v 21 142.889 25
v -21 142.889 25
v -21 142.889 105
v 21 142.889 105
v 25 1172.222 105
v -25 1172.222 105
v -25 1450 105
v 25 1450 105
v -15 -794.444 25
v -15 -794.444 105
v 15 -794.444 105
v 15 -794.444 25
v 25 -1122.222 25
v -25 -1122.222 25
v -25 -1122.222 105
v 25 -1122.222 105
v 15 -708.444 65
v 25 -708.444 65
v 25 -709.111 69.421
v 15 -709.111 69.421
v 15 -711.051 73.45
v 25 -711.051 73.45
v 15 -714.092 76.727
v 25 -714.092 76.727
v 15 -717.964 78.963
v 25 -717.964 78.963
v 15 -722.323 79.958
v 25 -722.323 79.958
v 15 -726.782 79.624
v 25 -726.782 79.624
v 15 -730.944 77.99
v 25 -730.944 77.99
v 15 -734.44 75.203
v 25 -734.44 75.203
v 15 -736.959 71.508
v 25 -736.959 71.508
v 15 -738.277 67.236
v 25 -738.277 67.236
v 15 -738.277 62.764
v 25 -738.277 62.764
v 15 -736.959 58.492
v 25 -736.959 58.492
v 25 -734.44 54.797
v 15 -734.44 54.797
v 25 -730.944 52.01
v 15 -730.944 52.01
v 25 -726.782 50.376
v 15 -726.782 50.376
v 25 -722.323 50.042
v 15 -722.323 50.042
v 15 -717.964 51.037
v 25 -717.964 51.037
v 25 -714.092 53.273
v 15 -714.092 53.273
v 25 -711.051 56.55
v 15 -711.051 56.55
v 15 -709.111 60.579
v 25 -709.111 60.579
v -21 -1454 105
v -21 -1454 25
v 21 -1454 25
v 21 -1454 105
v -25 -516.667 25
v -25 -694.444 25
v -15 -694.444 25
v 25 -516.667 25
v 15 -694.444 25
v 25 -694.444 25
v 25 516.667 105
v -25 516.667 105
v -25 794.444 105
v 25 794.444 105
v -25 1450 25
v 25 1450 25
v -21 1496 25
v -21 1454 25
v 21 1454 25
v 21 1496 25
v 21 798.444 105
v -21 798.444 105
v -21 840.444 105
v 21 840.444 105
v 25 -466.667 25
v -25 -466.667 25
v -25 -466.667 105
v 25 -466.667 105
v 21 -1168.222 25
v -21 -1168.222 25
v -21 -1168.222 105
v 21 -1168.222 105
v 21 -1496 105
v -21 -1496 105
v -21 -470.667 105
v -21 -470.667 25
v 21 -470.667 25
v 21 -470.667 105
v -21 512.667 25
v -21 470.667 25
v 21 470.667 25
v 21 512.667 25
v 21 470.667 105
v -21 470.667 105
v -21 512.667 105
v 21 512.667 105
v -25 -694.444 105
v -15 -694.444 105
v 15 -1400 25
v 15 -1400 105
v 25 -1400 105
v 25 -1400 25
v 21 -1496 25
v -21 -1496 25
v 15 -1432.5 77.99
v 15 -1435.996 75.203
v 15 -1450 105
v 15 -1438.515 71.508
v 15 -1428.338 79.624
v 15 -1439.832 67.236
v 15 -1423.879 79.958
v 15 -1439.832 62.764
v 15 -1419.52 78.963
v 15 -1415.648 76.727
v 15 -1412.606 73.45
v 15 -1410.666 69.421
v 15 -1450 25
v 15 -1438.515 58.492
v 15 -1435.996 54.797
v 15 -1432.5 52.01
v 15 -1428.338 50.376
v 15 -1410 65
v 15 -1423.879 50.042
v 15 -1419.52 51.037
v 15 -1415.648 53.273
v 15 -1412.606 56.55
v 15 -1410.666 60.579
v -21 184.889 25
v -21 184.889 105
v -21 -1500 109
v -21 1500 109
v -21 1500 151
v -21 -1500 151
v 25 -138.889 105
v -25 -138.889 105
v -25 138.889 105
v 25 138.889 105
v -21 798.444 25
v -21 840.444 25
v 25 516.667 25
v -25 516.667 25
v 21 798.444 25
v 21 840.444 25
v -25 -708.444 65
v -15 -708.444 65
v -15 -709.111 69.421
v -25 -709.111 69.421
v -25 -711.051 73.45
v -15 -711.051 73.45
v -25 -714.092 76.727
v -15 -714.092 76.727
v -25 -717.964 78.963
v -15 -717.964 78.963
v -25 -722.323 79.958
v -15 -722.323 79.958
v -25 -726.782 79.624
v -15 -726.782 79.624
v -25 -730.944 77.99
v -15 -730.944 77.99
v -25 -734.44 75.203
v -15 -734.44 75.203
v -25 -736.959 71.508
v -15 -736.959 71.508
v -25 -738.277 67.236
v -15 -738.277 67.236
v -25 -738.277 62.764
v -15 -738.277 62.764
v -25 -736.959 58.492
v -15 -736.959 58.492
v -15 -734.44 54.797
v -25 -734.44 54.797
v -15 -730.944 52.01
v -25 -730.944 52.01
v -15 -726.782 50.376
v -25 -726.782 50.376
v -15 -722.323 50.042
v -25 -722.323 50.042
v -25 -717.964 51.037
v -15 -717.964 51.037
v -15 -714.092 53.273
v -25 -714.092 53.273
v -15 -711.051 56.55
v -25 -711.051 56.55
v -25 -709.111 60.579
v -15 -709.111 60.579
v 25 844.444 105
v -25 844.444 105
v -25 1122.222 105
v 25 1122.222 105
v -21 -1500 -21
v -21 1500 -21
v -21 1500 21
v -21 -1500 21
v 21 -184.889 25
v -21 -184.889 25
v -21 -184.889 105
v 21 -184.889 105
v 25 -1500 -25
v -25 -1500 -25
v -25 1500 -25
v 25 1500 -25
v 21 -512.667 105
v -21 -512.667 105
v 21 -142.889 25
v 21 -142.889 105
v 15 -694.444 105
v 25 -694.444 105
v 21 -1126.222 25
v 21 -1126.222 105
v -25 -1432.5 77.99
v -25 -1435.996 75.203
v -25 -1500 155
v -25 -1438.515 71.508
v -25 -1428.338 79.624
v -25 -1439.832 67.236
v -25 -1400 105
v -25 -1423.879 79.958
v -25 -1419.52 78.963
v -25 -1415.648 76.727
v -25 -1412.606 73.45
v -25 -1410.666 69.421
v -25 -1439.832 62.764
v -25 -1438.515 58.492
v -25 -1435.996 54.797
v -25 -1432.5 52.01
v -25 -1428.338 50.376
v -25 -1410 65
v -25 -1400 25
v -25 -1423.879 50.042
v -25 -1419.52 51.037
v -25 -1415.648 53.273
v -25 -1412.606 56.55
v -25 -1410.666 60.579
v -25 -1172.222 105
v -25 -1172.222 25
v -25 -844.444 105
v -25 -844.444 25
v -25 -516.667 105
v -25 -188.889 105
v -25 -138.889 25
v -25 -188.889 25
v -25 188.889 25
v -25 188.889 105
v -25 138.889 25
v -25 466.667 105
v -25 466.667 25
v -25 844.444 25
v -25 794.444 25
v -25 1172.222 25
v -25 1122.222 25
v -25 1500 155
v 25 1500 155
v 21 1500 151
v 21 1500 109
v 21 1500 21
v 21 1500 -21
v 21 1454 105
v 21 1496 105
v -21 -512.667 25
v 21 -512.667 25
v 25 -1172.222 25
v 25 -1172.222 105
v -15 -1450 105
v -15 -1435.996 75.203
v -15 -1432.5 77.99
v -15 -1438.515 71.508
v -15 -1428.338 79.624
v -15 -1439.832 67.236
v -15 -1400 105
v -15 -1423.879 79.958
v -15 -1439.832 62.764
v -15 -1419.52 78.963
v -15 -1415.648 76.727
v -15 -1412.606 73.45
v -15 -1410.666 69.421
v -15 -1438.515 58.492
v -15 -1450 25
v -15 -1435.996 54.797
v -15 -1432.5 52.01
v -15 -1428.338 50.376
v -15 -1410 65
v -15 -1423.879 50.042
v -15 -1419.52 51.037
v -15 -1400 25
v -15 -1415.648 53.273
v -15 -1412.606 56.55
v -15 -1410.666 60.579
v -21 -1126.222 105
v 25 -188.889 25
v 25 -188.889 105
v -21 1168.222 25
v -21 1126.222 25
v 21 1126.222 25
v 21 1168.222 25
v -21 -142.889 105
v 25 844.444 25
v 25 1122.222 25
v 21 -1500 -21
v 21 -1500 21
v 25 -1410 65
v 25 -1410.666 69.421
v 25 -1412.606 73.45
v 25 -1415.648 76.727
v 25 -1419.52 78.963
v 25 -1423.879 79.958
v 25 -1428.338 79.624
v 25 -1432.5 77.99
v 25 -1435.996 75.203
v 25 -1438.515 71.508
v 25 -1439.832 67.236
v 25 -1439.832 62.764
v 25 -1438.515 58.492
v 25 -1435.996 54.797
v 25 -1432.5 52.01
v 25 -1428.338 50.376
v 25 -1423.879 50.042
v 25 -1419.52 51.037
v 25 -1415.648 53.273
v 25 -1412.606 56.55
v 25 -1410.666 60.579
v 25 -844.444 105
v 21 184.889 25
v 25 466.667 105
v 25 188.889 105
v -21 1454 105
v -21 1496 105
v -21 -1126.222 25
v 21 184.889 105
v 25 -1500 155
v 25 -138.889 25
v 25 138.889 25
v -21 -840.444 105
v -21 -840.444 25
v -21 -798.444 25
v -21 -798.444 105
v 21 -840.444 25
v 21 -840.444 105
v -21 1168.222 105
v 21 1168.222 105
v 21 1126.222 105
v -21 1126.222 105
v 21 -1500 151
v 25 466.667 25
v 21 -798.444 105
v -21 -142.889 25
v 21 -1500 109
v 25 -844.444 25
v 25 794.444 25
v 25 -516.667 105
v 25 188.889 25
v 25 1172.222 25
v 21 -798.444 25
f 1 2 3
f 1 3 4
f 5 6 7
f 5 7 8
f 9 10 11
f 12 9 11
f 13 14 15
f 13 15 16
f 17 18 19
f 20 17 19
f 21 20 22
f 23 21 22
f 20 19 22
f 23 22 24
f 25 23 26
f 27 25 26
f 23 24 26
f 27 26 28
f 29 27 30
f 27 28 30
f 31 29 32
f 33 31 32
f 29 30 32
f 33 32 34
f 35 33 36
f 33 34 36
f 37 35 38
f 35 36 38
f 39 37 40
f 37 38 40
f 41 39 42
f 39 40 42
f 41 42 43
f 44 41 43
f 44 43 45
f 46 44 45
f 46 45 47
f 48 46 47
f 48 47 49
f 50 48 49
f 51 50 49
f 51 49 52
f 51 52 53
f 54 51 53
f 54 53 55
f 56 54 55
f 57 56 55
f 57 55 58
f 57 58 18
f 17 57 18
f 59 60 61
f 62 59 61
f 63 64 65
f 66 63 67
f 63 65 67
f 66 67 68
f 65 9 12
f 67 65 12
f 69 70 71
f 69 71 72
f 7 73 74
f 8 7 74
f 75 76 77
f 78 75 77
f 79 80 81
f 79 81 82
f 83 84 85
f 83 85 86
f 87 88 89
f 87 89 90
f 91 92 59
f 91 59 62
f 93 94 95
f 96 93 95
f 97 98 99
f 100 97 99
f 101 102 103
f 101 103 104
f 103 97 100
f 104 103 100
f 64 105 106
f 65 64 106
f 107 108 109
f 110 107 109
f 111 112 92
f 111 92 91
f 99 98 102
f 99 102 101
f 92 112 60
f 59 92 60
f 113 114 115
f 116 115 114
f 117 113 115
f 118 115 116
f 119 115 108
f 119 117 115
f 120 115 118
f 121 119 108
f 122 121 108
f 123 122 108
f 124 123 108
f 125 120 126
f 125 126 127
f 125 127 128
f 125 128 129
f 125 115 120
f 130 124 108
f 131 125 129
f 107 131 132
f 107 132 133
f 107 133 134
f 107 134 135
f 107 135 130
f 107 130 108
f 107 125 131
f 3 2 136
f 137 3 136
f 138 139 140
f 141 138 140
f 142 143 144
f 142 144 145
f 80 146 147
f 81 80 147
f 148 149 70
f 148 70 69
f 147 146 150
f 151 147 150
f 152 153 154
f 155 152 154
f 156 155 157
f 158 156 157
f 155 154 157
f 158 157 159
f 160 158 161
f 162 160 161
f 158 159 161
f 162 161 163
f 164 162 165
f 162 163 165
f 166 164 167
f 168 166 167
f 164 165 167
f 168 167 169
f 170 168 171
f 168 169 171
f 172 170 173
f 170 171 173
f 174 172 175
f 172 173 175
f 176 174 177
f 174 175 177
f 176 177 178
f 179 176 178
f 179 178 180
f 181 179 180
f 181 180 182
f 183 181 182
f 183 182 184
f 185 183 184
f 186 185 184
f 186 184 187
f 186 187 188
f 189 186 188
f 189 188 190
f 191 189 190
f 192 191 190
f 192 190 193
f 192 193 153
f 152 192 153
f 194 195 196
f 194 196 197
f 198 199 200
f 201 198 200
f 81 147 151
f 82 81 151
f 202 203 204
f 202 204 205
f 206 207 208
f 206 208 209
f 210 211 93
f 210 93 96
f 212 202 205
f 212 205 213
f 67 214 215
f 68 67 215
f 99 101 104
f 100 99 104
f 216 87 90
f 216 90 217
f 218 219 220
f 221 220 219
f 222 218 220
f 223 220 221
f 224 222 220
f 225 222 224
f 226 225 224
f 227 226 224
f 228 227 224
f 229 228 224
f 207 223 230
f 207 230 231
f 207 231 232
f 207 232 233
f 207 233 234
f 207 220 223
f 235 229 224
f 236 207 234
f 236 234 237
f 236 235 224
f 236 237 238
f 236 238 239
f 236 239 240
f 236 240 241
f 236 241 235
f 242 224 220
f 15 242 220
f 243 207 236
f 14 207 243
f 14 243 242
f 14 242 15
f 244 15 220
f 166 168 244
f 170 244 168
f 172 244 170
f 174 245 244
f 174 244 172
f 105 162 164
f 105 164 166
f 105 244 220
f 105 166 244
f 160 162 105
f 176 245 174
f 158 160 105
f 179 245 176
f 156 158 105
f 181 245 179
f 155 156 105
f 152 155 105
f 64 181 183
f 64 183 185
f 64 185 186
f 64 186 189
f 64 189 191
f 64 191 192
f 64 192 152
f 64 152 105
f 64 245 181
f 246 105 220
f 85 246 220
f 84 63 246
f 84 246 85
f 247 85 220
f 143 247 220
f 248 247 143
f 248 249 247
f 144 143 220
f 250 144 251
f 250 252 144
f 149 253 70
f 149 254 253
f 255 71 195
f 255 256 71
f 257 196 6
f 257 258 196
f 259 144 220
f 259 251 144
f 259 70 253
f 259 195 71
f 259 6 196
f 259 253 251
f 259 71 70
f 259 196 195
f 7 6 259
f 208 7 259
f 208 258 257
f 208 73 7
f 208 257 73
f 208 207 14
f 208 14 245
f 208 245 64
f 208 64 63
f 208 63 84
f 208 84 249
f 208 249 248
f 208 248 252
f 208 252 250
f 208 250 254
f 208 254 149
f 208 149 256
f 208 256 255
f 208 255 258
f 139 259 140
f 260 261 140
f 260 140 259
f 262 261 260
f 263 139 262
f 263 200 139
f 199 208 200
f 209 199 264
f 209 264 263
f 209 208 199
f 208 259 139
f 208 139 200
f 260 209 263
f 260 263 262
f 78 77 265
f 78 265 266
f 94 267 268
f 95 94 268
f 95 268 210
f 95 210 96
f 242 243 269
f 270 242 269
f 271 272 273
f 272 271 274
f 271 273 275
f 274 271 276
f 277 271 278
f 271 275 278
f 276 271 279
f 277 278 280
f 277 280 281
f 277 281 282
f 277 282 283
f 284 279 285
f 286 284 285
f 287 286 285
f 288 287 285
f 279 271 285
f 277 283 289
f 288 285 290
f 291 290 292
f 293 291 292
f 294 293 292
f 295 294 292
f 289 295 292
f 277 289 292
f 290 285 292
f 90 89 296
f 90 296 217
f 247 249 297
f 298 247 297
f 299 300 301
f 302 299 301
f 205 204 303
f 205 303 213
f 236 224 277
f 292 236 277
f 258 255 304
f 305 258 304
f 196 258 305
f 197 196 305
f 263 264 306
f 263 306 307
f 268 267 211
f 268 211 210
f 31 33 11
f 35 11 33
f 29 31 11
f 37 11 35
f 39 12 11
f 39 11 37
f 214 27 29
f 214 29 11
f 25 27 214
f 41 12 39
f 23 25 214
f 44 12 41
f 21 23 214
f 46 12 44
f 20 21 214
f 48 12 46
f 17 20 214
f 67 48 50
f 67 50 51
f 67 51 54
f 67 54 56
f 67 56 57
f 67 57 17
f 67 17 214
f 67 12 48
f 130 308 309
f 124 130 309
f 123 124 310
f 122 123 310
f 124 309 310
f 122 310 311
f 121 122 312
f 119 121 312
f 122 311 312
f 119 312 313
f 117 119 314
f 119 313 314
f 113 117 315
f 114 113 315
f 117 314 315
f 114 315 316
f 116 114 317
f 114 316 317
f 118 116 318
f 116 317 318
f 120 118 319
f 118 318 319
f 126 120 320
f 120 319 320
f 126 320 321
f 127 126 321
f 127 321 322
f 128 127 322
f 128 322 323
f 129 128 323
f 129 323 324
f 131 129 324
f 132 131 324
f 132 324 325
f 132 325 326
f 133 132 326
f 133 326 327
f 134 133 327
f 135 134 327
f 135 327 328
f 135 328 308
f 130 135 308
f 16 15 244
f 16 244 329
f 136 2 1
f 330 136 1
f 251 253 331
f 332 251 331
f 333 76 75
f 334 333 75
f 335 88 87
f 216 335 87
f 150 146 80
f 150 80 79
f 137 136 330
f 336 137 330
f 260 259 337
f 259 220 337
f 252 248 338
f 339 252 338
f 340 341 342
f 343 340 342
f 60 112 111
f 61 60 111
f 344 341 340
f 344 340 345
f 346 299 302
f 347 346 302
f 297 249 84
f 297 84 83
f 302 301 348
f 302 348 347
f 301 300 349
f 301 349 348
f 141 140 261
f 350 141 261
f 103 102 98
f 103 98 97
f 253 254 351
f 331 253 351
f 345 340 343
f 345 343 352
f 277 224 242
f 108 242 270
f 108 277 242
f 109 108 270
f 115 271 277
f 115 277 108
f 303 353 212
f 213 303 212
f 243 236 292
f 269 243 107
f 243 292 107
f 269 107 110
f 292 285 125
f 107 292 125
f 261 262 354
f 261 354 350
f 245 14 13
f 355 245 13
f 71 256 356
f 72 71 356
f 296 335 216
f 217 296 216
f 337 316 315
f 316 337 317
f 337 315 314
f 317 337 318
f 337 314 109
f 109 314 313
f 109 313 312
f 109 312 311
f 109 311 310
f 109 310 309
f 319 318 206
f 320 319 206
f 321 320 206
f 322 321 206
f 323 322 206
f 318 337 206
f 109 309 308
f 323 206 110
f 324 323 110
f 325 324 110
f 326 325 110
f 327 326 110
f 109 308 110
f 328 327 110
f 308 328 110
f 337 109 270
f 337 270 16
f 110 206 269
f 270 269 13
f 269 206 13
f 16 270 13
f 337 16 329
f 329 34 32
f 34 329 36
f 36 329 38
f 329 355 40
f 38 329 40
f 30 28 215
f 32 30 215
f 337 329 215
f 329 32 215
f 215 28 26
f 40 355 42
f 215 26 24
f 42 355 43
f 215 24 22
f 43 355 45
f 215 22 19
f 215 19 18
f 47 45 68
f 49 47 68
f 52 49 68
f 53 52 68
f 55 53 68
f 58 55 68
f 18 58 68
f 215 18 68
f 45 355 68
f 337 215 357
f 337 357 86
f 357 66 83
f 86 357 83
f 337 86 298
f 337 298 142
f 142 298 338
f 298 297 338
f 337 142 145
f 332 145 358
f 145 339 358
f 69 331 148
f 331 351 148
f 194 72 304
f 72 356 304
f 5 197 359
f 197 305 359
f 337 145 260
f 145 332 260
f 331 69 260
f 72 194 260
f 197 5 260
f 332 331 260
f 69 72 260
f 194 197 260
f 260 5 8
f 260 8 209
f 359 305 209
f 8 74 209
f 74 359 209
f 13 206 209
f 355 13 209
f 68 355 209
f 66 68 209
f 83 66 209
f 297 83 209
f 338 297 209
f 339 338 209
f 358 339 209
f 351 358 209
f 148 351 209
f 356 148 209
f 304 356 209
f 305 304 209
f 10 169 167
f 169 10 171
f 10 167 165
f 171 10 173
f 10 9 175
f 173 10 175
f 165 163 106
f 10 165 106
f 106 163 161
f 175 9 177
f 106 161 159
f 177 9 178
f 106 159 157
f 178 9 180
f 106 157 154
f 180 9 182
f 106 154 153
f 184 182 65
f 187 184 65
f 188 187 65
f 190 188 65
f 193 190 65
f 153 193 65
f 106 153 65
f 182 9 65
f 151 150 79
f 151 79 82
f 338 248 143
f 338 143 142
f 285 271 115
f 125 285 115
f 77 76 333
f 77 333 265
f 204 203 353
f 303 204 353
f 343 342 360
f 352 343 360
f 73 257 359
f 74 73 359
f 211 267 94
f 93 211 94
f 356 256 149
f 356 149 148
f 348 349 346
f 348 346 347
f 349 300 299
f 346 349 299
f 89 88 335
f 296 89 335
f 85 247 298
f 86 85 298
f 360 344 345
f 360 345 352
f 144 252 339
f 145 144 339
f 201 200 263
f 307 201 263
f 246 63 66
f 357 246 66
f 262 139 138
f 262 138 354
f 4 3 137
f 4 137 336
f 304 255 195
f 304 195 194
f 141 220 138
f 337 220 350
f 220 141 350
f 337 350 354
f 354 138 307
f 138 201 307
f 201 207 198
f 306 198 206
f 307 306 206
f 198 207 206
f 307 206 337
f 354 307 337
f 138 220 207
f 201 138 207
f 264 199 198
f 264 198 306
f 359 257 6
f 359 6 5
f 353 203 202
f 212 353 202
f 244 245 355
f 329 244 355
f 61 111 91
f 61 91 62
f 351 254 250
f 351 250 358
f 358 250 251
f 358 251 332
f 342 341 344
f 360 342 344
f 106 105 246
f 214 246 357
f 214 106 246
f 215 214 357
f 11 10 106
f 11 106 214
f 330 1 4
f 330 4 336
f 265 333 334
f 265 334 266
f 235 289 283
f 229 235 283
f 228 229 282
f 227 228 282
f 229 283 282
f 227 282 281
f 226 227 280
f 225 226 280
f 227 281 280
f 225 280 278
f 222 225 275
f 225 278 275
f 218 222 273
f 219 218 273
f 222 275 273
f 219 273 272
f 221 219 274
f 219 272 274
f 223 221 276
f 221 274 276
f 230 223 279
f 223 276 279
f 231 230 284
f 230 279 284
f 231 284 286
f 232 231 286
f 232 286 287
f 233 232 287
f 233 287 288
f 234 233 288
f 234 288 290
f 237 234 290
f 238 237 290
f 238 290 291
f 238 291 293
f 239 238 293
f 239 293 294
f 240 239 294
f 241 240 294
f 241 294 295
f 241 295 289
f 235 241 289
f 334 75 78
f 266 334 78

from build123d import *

# Parameters (mm, degrees)
F0_W     = 50
F0_H     = 50
F0_W_2   = 42
F0_H_2   = 42
F1_DEPTH = 1500
F2_W     = 50
F2_H     = 50
F2_W_2   = 42
F2_H_2   = 42
F3_DEPTH = 80
F5_W     = 10
F5_H     = 50
F5_H_2   = 100
F6_DEPTH = 80
F7_R     = 15
F8_DEPTH = 50.001


with BuildPart() as f1:
    # F0 (on Front) → F1 (new body, symmetric)
    with BuildSketch(Plane.XZ):
        Rectangle(F0_W, F0_H)
        Rectangle(F0_W_2, F0_H_2, mode=Mode.SUBTRACT)
    extrude(amount=F1_DEPTH, both=True)


with BuildPart() as f1b:
    # F0 (on Front) → F1, piece 2 (new body, symmetric)
    with BuildSketch(Plane.XZ):
        with Locations((0, 130)):
            Rectangle(F0_W, F0_H)
        with Locations((0, 130)):
            Rectangle(F0_W_2, F0_H_2, mode=Mode.SUBTRACT)
    extrude(amount=F1_DEPTH, both=True)


with BuildPart() as f3:
    # F2 (on face) → F3 (new body, through all)
    with BuildSketch(Plane.XY.offset(25)):
        with Locations((0, 1475)):
            Rectangle(F2_W, F2_H)
        with Locations((0, 1475)):
            Rectangle(F2_W_2, F2_H_2, mode=Mode.SUBTRACT)
    extrude(amount=F3_DEPTH)


with BuildPart() as f3b:
    # F2 (on face) → F3, piece 2 (new body, through all)
    with BuildSketch(Plane.XY.offset(25)):
        with Locations((0, 1147.2222222222)):
            Rectangle(F2_W, F2_H)
        with Locations((0, 1147.2222222222)):
            Rectangle(F2_W_2, F2_H_2, mode=Mode.SUBTRACT)
    extrude(amount=F3_DEPTH)


with BuildPart() as f3c:
    # F2 (on face) → F3, piece 3 (new body, through all)
    with BuildSketch(Plane.XY.offset(25)):
        with Locations((0, 819.4444444444)):
            Rectangle(F2_W, F2_H)
        with Locations((0, 819.4444444444)):
            Rectangle(F2_W_2, F2_H_2, mode=Mode.SUBTRACT)
    extrude(amount=F3_DEPTH)


with BuildPart() as f3d:
    # F2 (on face) → F3, piece 4 (new body, through all)
    with BuildSketch(Plane.XY.offset(25)):
        with Locations((0, 491.6666666667)):
            Rectangle(F2_W, F2_H)
        with Locations((0, 491.6666666667)):
            Rectangle(F2_W_2, F2_H_2, mode=Mode.SUBTRACT)
    extrude(amount=F3_DEPTH)


with BuildPart() as f3e:
    # F2 (on face) → F3, piece 5 (new body, through all)
    with BuildSketch(Plane.XY.offset(25)):
        with Locations((0, 163.8888888889)):
            Rectangle(F2_W, F2_H)
        with Locations((0, 163.8888888889)):
            Rectangle(F2_W_2, F2_H_2, mode=Mode.SUBTRACT)
    extrude(amount=F3_DEPTH)


with BuildPart() as f3f:
    # F2 (on face) → F3, piece 6 (new body, through all)
    with BuildSketch(Plane.XY.offset(25)):
        with Locations((0, -163.8888888889)):
            Rectangle(F2_W, F2_H)
        with Locations((0, -163.8888888889)):
            Rectangle(F2_W_2, F2_H_2, mode=Mode.SUBTRACT)
    extrude(amount=F3_DEPTH)


with BuildPart() as f3g:
    # F2 (on face) → F3, piece 7 (new body, through all)
    with BuildSketch(Plane.XY.offset(25)):
        with Locations((0, -491.6666666667)):
            Rectangle(F2_W, F2_H)
        with Locations((0, -491.6666666667)):
            Rectangle(F2_W_2, F2_H_2, mode=Mode.SUBTRACT)
    extrude(amount=F3_DEPTH)


with BuildPart() as f3h:
    # F2 (on face) → F3, piece 8 (new body, through all)
    with BuildSketch(Plane.XY.offset(25)):
        with Locations((0, -819.4444444444)):
            Rectangle(F2_W, F2_H)
        with Locations((0, -819.4444444444)):
            Rectangle(F2_W_2, F2_H_2, mode=Mode.SUBTRACT)
    extrude(amount=F3_DEPTH)


with BuildPart() as f3i:
    # F2 (on face) → F3, piece 9 (new body, through all)
    with BuildSketch(Plane.XY.offset(25)):
        with Locations((0, -1147.2222222222)):
            Rectangle(F2_W, F2_H)
        with Locations((0, -1147.2222222222)):
            Rectangle(F2_W_2, F2_H_2, mode=Mode.SUBTRACT)
    extrude(amount=F3_DEPTH)


with BuildPart() as f3j:
    # F2 (on face) → F3, piece 10 (new body, through all)
    with BuildSketch(Plane.XY.offset(25)):
        with Locations((0, -1475)):
            Rectangle(F2_W, F2_H)
        with Locations((0, -1475)):
            Rectangle(F2_W_2, F2_H_2, mode=Mode.SUBTRACT)
    extrude(amount=F3_DEPTH)


with BuildPart() as f1_1:
    add(f1.part)

    # F4: union F1b, F3, F3b, F3c, F3d, F3e, F3f, F3g, F3h, F3i, F3j
    add(f1b.part)
    add(f3.part)
    add(f3b.part)
    add(f3c.part)
    add(f3d.part)
    add(f3e.part)
    add(f3f.part)
    add(f3g.part)
    add(f3h.part)
    add(f3i.part)
    add(f3j.part)

    # F5 (on face) → F6 (join, through all)
    with BuildSketch(Plane.XY.offset(25)):
        with Locations((20, -1425)):
            Rectangle(F5_W, F5_H)
        with Locations((20, -744.4444444444)):
            Rectangle(F5_W, F5_H_2)
        with Locations((-20, -1425)):
            Rectangle(F5_W, F5_H)
        with Locations((-20, -744.4444444444)):
            Rectangle(F5_W, F5_H_2)
    extrude(amount=F6_DEPTH)

    # F7 (on face) → F8 (cut, through all)
    with BuildSketch(Plane.YZ.offset(25)):
        with Locations((-723.4444444444, 65)):
            Circle(F7_R)
        with Locations((-1425, 65)):
            Circle(F7_R)
    extrude(amount=-F8_DEPTH, mode=Mode.SUBTRACT)


solid = f1_1.part
